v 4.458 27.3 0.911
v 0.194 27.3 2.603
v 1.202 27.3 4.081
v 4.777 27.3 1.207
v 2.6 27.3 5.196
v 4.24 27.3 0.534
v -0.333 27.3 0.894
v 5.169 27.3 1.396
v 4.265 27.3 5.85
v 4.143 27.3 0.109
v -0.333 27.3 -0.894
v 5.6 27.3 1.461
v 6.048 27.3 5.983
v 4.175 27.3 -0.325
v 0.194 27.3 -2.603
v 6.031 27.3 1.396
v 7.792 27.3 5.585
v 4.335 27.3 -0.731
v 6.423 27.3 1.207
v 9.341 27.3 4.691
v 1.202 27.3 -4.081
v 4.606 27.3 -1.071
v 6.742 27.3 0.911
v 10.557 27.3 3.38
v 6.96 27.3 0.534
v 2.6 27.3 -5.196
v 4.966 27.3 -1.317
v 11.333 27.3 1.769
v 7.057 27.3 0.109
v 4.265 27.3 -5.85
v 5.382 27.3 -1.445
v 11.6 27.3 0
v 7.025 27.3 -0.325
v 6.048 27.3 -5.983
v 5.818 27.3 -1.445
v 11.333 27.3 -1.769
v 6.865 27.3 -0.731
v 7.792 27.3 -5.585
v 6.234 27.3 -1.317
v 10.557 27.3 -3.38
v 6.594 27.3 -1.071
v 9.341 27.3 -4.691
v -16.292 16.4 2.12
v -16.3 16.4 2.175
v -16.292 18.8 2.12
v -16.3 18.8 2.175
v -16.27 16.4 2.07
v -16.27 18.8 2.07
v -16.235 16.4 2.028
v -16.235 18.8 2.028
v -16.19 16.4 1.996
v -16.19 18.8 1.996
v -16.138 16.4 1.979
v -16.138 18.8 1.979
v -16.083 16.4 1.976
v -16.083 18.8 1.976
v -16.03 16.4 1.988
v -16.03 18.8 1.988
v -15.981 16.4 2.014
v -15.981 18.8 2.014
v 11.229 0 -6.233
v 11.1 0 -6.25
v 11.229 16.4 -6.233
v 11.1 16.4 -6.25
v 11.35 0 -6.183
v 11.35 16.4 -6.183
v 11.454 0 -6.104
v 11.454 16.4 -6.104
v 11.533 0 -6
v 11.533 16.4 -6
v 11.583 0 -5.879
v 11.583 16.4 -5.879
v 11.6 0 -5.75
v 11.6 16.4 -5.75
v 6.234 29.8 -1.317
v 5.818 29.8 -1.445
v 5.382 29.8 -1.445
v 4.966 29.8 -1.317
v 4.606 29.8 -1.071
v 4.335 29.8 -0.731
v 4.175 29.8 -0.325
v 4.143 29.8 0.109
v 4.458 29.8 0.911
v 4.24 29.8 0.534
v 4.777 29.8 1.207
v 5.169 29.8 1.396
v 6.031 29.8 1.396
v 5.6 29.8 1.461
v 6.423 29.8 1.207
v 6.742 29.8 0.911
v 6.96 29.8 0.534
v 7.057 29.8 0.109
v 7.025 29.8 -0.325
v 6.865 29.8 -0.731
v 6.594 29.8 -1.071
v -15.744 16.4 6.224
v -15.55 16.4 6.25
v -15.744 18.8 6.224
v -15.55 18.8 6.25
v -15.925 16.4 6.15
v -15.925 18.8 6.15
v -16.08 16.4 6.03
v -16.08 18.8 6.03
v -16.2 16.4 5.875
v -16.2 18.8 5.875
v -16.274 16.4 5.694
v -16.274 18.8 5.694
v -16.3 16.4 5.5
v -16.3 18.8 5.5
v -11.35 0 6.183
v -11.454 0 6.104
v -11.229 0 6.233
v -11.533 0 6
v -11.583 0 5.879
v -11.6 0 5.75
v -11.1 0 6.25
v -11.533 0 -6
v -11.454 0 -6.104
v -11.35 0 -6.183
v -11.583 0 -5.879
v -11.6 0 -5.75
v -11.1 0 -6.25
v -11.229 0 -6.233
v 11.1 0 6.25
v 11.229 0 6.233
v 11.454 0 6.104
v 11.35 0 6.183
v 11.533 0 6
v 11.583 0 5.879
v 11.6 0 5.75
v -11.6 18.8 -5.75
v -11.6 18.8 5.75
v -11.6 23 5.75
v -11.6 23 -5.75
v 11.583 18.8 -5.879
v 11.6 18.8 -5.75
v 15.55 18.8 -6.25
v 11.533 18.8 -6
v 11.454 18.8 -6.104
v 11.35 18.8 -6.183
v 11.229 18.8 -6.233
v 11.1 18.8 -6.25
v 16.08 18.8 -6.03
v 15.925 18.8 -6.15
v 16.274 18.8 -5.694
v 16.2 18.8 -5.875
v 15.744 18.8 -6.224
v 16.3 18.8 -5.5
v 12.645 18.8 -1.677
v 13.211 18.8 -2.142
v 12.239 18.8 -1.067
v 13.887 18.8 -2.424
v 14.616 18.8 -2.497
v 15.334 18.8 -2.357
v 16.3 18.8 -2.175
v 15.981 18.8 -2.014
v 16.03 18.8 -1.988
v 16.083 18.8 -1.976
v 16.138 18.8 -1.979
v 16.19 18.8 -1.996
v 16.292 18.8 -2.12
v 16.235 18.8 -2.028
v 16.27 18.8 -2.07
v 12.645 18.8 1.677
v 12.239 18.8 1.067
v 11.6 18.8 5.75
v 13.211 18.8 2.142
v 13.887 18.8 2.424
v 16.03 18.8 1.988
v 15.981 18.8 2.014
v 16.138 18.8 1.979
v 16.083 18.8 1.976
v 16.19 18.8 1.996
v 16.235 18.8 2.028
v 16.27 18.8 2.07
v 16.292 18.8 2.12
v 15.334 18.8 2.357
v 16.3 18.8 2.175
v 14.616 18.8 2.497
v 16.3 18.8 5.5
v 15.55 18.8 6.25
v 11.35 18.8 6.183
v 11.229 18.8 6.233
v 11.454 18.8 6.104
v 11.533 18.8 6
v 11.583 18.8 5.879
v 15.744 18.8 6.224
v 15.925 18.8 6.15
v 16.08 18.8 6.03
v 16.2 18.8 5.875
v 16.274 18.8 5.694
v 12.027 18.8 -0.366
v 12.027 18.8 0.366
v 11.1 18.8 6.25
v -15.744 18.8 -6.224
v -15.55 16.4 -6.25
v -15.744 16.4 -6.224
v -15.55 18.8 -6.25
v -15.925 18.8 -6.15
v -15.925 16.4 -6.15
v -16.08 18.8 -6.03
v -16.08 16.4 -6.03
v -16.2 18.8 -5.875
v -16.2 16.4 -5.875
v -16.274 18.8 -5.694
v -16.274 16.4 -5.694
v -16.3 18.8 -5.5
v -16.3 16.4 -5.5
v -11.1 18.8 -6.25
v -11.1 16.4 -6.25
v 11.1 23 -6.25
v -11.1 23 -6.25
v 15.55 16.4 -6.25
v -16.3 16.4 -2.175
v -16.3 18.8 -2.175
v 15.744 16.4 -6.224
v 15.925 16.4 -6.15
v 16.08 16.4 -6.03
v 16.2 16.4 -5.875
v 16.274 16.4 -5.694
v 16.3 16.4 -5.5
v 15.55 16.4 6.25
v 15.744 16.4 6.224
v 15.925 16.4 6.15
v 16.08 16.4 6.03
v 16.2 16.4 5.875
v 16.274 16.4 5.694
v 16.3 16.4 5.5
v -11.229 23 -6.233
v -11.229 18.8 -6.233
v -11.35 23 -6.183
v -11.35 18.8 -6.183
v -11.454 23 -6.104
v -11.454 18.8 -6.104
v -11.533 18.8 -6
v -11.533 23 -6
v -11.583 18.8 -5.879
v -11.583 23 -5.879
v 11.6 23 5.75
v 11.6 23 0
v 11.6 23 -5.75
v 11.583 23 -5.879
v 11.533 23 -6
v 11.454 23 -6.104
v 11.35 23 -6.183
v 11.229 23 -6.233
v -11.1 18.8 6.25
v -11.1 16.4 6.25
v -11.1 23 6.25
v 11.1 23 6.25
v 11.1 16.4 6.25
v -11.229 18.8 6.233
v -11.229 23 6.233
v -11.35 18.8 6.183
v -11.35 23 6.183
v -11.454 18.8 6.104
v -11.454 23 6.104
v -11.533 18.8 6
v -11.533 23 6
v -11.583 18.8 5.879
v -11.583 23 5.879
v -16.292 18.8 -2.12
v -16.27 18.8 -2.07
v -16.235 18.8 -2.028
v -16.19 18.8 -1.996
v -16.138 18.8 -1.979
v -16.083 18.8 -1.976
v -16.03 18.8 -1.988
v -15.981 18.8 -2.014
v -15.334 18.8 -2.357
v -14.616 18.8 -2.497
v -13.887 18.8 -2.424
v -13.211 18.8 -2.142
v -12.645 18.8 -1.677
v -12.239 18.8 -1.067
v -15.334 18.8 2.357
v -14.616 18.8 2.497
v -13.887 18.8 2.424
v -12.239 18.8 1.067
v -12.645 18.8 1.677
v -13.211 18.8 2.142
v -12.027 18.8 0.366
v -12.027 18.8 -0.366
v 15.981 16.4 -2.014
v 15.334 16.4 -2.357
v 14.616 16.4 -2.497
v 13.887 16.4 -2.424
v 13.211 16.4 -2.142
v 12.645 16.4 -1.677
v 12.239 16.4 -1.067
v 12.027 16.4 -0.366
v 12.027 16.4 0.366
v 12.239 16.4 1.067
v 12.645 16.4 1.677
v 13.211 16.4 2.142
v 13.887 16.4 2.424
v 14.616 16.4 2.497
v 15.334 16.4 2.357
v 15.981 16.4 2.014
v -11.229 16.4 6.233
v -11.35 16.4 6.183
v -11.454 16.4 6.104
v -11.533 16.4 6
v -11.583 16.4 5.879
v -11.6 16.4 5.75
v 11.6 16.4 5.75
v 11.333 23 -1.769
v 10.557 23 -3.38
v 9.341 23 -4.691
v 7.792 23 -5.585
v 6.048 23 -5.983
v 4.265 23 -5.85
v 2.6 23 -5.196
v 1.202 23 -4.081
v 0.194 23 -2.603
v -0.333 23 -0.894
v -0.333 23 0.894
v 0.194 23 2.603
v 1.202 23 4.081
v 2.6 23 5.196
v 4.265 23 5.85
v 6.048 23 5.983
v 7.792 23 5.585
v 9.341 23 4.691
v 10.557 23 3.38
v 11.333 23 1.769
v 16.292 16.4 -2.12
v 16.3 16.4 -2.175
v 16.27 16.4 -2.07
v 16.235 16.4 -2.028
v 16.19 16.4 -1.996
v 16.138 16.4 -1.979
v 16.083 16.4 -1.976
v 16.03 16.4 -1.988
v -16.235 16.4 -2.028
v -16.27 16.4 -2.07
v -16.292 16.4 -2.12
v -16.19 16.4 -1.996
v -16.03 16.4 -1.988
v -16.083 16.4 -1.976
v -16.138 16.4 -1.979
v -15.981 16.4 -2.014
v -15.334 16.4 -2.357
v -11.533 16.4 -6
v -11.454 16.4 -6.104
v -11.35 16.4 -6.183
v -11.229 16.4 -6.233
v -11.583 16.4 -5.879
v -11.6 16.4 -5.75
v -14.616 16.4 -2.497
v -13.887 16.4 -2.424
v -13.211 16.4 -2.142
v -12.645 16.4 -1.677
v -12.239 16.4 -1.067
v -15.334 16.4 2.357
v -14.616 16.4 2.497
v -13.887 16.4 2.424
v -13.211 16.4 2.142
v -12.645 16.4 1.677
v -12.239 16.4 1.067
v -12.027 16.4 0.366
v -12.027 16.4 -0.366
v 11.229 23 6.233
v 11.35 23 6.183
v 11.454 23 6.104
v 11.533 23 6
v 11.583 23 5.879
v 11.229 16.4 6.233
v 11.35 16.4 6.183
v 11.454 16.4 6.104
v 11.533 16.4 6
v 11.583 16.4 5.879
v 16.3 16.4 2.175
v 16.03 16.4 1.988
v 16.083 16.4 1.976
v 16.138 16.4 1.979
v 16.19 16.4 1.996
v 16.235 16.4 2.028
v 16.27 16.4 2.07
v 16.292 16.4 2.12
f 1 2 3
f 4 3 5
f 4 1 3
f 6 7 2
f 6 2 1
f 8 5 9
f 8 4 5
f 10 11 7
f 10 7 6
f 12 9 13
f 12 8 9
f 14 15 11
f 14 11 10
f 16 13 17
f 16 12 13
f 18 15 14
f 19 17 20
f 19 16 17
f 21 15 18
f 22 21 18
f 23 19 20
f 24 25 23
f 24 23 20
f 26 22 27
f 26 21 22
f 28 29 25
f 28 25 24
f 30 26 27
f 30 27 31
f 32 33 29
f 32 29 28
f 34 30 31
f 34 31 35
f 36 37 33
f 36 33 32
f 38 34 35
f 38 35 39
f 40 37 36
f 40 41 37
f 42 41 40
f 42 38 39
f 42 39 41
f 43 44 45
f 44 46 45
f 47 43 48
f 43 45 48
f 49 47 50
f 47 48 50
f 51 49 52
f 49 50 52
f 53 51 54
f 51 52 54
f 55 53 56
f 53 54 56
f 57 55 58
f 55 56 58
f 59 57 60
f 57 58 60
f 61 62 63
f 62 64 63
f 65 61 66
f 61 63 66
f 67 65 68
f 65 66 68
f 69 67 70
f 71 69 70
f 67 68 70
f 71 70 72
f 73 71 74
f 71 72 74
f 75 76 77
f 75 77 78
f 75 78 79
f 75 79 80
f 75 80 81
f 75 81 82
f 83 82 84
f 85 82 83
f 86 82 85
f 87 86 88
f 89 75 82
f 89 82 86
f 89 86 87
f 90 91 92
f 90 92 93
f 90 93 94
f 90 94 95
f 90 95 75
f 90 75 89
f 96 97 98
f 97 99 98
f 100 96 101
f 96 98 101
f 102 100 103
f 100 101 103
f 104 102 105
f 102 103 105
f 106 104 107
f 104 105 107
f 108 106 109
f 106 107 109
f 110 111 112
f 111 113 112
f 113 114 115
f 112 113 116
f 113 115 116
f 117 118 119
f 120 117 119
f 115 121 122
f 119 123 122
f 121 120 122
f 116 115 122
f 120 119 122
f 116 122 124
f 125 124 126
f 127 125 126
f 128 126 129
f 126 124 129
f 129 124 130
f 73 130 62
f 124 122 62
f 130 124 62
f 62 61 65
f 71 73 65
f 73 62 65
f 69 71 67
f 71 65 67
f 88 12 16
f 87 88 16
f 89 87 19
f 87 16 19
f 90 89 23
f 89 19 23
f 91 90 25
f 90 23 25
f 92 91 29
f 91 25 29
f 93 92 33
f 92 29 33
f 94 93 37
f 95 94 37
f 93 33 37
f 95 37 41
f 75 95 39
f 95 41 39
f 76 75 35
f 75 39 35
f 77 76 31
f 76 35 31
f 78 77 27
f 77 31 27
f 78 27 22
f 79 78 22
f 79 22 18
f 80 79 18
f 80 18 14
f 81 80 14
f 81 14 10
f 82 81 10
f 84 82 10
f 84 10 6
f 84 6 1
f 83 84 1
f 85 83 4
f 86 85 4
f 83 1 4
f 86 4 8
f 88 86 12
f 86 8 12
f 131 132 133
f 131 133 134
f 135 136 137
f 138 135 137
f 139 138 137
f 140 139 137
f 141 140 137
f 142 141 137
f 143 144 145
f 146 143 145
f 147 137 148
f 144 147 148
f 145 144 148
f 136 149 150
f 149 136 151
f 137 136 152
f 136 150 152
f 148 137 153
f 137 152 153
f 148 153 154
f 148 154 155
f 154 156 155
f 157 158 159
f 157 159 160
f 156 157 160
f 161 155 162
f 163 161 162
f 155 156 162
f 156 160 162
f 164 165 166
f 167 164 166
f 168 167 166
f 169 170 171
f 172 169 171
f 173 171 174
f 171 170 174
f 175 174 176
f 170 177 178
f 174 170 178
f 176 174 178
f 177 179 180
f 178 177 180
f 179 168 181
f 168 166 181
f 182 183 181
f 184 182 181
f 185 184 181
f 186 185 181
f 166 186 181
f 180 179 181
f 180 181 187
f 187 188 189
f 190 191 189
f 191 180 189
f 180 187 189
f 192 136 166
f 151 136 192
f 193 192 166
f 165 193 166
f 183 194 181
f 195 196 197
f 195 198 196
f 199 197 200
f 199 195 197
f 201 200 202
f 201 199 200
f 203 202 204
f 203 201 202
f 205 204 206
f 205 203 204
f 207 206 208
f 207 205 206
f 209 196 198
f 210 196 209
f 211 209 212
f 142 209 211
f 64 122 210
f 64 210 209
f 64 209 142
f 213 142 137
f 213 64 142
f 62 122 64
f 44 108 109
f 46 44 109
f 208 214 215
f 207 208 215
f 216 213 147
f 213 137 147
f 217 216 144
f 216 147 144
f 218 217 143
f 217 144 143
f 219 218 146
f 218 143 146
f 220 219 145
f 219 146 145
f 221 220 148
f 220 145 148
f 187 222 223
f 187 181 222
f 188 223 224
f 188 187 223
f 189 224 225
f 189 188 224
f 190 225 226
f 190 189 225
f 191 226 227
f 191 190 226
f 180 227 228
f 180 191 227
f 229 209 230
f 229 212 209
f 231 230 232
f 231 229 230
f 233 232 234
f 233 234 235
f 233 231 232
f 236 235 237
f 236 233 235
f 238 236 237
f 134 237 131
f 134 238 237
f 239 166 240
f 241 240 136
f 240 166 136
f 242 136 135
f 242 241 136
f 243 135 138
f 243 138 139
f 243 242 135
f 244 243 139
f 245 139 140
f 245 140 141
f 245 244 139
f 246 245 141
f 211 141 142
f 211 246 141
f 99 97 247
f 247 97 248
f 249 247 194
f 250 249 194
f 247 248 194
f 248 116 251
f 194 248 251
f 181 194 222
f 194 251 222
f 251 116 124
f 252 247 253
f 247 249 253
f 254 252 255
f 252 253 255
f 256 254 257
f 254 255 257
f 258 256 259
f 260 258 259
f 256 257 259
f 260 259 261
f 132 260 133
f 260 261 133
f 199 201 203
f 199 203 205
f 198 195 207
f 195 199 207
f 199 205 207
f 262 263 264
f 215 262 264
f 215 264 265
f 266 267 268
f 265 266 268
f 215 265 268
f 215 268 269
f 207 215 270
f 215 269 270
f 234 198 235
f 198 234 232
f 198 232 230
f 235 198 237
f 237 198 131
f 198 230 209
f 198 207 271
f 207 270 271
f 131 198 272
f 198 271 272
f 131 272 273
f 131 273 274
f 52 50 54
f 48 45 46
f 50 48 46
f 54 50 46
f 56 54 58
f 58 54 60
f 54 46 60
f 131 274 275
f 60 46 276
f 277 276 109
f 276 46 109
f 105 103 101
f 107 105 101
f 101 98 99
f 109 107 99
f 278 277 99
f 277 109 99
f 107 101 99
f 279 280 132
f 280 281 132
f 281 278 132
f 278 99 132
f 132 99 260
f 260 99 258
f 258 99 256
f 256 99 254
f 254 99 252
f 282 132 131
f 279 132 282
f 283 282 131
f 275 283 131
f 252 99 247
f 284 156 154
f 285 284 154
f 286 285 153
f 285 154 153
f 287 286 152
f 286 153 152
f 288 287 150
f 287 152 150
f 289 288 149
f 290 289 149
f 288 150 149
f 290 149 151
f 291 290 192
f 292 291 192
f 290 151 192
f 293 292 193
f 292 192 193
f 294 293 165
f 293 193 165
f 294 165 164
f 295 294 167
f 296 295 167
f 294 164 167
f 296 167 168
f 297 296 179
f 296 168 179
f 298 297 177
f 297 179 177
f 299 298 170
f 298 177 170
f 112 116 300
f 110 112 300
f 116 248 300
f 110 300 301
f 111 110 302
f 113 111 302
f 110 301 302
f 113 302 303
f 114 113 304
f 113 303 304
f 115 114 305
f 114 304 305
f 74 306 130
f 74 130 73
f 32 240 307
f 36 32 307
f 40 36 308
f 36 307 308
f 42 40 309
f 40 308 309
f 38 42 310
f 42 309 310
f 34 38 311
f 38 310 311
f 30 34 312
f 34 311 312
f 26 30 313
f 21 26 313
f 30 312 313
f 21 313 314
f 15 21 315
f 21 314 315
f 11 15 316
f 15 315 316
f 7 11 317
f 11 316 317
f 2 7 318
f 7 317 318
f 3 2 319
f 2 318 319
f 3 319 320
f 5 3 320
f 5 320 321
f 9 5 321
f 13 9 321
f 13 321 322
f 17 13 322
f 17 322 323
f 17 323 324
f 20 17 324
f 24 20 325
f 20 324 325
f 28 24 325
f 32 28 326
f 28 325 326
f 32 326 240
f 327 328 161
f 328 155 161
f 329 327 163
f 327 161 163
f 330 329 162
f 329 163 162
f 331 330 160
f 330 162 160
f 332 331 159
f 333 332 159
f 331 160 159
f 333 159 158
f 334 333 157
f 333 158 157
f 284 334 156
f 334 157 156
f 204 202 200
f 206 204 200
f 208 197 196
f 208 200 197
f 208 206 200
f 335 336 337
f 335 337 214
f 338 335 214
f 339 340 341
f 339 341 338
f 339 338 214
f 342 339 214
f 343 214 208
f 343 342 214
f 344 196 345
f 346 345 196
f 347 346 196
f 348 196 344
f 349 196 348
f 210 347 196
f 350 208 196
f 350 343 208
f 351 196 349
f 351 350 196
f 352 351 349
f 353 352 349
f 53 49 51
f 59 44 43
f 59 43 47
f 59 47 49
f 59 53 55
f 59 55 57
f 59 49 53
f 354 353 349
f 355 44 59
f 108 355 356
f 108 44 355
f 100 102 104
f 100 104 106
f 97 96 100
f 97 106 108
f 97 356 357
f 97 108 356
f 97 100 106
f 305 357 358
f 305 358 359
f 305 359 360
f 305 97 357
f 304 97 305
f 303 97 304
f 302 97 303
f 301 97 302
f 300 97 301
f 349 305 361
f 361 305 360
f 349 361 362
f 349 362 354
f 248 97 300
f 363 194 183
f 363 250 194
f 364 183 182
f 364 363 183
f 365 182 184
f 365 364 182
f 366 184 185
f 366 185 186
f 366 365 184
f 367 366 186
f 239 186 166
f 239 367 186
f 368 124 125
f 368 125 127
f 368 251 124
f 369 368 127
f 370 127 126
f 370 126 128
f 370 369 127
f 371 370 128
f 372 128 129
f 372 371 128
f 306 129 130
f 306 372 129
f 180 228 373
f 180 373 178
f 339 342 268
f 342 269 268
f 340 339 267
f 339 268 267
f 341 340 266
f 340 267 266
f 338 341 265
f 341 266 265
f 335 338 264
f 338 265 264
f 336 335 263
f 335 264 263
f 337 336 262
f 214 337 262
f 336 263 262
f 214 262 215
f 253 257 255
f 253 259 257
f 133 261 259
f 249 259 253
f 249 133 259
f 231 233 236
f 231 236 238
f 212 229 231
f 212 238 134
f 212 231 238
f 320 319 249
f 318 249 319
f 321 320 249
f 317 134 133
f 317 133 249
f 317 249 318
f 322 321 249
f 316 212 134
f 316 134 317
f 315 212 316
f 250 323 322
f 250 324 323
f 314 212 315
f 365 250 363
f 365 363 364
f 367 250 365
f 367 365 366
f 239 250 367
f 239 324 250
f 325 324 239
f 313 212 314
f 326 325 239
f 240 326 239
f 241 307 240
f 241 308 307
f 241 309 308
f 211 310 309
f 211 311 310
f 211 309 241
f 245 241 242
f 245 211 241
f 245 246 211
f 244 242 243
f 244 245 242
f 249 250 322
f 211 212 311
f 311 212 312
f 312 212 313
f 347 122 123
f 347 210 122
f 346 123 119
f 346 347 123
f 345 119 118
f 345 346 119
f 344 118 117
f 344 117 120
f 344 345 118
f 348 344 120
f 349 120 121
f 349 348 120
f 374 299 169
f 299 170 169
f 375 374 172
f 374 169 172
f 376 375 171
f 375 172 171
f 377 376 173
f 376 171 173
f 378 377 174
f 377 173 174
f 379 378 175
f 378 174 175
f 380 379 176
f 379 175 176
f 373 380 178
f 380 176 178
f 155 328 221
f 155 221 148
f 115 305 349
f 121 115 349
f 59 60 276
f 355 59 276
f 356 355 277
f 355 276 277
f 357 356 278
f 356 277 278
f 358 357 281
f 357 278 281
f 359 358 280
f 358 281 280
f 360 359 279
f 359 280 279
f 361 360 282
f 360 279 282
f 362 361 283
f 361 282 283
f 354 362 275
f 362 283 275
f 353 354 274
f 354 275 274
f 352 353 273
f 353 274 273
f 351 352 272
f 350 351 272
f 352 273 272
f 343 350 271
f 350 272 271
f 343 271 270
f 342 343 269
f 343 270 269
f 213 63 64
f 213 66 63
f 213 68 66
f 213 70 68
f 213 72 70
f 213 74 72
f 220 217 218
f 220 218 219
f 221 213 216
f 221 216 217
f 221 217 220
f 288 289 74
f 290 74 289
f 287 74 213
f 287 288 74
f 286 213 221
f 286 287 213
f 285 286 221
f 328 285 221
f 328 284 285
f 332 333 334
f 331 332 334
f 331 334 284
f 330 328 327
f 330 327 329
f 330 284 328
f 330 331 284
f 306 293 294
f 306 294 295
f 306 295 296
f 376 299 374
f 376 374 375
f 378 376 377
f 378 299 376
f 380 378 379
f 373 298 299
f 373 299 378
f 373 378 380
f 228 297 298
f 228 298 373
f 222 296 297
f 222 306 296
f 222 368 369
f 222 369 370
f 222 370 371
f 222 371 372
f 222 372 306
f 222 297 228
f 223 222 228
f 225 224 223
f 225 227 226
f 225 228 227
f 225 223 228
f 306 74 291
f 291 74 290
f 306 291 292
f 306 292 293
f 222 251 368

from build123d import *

# Parameters (mm, degrees)
ESQUISSE1_W             = 23.2
ESQUISSE1_H             = 12.5
BOSS_EXTRU_1_DEPTH      = 23
ESQUISSE2_W             = 4.7
ESQUISSE2_H             = 2.4
BOSS_EXTRU_2_DEPTH      = 12.5
CONG_1_R                = 0.75
ESQUISSE3_R             = 2.5
ENL_V_MAT_EXTRU_1_DEPTH = 11.8
CONG_2_R                = 0.2
CONG_3_R                = 0.5
ESQUISSE5_R             = 6
BOSS_EXTRU_3_DEPTH      = 4.3
ESQUISSE6_R             = 1.461217274
BOSS_EXTRU_4_DEPTH      = 2.5


with BuildPart() as part:
    # Esquisse1 → Boss.-Extru.1 (new body)
    with BuildSketch(Plane(origin=(0, 0, 0), x_dir=(1, 0, 0), z_dir=(0, 1, 0))):
        Rectangle(ESQUISSE1_W, ESQUISSE1_H)
    extrude(amount=BOSS_EXTRU_1_DEPTH)

    # Esquisse2 → Boss.-Extru.2 (add)
    with BuildSketch(Plane.XY.offset(6.25)):
        with Locations((13.95, 17.6)):
            Rectangle(ESQUISSE2_W, ESQUISSE2_H)
        with Locations((-13.95, 17.6)):
            Rectangle(ESQUISSE2_W, ESQUISSE2_H)
    extrude(amount=-BOSS_EXTRU_2_DEPTH)

    # Congé1
    cong_1_edges = [part.edges().sort_by_distance(p)[0] for p in [
        (16.3, 17.6, -6.25),
        (16.3, 17.6, 6.25),
        (-16.3, 17.6, -6.25),
        (-16.3, 17.6, 6.25),
    ]]
    fillet(cong_1_edges, radius=CONG_1_R)

    # Esquisse3 → Enlèv. mat.-Extru.1 (cut)
    with BuildSketch(Plane(origin=(0, 23, 0), x_dir=(1, 0, 0), z_dir=(0, 1, 0))):
        with Locations((-14.5, 0)):
            Circle(ESQUISSE3_R)
        with Locations((14.5, 0)):
            Circle(ESQUISSE3_R)
    extrude(amount=-ENL_V_MAT_EXTRU_1_DEPTH, mode=Mode.SUBTRACT)

    # Congé2
    cong_2_edges = [part.edges().sort_by_distance(p)[0] for p in [
        (-16.3, 17.6, -1.734935157),
        (-16.3, 17.6, 1.734935157),
        (16.3, 17.6, -1.734935157),
        (16.3, 17.6, 1.734935157),
    ]]
    fillet(cong_2_edges, radius=CONG_2_R)

    # Congé3
    cong_3_edges = [part.edges().sort_by_distance(p)[0] for p in [
        (11.6, 8.2, -6.25),
        (11.6, 8.2, 6.25),
        (-11.6, 8.2, 6.25),
        (-11.6, 8.2, -6.25),
        (11.6, 20.9, 6.25),
        (-11.6, 20.9, 6.25),
        (-11.6, 20.9, -6.25),
        (11.6, 20.9, -6.25),
    ]]
    fillet(cong_3_edges, radius=CONG_3_R)

    # Esquisse5 → Boss.-Extru.3 (add)
    with BuildSketch(Plane(origin=(0, 23, 0), x_dir=(1, 0, 0), z_dir=(0, 1, 0))):
        with Locations((5.6, 0)):
            Circle(ESQUISSE5_R)
    extrude(amount=BOSS_EXTRU_3_DEPTH)

    # Esquisse6 → Boss.-Extru.4 (add)
    with BuildSketch(Plane(origin=(0, 27.3, 0), x_dir=(1, 0, 0), z_dir=(0, 1, 0))):
        with Locations(Location((5.6, 0, 0), (0, 0, 270))):
            Circle(ESQUISSE6_R)
    extrude(amount=BOSS_EXTRU_4_DEPTH)


solid = part.part
